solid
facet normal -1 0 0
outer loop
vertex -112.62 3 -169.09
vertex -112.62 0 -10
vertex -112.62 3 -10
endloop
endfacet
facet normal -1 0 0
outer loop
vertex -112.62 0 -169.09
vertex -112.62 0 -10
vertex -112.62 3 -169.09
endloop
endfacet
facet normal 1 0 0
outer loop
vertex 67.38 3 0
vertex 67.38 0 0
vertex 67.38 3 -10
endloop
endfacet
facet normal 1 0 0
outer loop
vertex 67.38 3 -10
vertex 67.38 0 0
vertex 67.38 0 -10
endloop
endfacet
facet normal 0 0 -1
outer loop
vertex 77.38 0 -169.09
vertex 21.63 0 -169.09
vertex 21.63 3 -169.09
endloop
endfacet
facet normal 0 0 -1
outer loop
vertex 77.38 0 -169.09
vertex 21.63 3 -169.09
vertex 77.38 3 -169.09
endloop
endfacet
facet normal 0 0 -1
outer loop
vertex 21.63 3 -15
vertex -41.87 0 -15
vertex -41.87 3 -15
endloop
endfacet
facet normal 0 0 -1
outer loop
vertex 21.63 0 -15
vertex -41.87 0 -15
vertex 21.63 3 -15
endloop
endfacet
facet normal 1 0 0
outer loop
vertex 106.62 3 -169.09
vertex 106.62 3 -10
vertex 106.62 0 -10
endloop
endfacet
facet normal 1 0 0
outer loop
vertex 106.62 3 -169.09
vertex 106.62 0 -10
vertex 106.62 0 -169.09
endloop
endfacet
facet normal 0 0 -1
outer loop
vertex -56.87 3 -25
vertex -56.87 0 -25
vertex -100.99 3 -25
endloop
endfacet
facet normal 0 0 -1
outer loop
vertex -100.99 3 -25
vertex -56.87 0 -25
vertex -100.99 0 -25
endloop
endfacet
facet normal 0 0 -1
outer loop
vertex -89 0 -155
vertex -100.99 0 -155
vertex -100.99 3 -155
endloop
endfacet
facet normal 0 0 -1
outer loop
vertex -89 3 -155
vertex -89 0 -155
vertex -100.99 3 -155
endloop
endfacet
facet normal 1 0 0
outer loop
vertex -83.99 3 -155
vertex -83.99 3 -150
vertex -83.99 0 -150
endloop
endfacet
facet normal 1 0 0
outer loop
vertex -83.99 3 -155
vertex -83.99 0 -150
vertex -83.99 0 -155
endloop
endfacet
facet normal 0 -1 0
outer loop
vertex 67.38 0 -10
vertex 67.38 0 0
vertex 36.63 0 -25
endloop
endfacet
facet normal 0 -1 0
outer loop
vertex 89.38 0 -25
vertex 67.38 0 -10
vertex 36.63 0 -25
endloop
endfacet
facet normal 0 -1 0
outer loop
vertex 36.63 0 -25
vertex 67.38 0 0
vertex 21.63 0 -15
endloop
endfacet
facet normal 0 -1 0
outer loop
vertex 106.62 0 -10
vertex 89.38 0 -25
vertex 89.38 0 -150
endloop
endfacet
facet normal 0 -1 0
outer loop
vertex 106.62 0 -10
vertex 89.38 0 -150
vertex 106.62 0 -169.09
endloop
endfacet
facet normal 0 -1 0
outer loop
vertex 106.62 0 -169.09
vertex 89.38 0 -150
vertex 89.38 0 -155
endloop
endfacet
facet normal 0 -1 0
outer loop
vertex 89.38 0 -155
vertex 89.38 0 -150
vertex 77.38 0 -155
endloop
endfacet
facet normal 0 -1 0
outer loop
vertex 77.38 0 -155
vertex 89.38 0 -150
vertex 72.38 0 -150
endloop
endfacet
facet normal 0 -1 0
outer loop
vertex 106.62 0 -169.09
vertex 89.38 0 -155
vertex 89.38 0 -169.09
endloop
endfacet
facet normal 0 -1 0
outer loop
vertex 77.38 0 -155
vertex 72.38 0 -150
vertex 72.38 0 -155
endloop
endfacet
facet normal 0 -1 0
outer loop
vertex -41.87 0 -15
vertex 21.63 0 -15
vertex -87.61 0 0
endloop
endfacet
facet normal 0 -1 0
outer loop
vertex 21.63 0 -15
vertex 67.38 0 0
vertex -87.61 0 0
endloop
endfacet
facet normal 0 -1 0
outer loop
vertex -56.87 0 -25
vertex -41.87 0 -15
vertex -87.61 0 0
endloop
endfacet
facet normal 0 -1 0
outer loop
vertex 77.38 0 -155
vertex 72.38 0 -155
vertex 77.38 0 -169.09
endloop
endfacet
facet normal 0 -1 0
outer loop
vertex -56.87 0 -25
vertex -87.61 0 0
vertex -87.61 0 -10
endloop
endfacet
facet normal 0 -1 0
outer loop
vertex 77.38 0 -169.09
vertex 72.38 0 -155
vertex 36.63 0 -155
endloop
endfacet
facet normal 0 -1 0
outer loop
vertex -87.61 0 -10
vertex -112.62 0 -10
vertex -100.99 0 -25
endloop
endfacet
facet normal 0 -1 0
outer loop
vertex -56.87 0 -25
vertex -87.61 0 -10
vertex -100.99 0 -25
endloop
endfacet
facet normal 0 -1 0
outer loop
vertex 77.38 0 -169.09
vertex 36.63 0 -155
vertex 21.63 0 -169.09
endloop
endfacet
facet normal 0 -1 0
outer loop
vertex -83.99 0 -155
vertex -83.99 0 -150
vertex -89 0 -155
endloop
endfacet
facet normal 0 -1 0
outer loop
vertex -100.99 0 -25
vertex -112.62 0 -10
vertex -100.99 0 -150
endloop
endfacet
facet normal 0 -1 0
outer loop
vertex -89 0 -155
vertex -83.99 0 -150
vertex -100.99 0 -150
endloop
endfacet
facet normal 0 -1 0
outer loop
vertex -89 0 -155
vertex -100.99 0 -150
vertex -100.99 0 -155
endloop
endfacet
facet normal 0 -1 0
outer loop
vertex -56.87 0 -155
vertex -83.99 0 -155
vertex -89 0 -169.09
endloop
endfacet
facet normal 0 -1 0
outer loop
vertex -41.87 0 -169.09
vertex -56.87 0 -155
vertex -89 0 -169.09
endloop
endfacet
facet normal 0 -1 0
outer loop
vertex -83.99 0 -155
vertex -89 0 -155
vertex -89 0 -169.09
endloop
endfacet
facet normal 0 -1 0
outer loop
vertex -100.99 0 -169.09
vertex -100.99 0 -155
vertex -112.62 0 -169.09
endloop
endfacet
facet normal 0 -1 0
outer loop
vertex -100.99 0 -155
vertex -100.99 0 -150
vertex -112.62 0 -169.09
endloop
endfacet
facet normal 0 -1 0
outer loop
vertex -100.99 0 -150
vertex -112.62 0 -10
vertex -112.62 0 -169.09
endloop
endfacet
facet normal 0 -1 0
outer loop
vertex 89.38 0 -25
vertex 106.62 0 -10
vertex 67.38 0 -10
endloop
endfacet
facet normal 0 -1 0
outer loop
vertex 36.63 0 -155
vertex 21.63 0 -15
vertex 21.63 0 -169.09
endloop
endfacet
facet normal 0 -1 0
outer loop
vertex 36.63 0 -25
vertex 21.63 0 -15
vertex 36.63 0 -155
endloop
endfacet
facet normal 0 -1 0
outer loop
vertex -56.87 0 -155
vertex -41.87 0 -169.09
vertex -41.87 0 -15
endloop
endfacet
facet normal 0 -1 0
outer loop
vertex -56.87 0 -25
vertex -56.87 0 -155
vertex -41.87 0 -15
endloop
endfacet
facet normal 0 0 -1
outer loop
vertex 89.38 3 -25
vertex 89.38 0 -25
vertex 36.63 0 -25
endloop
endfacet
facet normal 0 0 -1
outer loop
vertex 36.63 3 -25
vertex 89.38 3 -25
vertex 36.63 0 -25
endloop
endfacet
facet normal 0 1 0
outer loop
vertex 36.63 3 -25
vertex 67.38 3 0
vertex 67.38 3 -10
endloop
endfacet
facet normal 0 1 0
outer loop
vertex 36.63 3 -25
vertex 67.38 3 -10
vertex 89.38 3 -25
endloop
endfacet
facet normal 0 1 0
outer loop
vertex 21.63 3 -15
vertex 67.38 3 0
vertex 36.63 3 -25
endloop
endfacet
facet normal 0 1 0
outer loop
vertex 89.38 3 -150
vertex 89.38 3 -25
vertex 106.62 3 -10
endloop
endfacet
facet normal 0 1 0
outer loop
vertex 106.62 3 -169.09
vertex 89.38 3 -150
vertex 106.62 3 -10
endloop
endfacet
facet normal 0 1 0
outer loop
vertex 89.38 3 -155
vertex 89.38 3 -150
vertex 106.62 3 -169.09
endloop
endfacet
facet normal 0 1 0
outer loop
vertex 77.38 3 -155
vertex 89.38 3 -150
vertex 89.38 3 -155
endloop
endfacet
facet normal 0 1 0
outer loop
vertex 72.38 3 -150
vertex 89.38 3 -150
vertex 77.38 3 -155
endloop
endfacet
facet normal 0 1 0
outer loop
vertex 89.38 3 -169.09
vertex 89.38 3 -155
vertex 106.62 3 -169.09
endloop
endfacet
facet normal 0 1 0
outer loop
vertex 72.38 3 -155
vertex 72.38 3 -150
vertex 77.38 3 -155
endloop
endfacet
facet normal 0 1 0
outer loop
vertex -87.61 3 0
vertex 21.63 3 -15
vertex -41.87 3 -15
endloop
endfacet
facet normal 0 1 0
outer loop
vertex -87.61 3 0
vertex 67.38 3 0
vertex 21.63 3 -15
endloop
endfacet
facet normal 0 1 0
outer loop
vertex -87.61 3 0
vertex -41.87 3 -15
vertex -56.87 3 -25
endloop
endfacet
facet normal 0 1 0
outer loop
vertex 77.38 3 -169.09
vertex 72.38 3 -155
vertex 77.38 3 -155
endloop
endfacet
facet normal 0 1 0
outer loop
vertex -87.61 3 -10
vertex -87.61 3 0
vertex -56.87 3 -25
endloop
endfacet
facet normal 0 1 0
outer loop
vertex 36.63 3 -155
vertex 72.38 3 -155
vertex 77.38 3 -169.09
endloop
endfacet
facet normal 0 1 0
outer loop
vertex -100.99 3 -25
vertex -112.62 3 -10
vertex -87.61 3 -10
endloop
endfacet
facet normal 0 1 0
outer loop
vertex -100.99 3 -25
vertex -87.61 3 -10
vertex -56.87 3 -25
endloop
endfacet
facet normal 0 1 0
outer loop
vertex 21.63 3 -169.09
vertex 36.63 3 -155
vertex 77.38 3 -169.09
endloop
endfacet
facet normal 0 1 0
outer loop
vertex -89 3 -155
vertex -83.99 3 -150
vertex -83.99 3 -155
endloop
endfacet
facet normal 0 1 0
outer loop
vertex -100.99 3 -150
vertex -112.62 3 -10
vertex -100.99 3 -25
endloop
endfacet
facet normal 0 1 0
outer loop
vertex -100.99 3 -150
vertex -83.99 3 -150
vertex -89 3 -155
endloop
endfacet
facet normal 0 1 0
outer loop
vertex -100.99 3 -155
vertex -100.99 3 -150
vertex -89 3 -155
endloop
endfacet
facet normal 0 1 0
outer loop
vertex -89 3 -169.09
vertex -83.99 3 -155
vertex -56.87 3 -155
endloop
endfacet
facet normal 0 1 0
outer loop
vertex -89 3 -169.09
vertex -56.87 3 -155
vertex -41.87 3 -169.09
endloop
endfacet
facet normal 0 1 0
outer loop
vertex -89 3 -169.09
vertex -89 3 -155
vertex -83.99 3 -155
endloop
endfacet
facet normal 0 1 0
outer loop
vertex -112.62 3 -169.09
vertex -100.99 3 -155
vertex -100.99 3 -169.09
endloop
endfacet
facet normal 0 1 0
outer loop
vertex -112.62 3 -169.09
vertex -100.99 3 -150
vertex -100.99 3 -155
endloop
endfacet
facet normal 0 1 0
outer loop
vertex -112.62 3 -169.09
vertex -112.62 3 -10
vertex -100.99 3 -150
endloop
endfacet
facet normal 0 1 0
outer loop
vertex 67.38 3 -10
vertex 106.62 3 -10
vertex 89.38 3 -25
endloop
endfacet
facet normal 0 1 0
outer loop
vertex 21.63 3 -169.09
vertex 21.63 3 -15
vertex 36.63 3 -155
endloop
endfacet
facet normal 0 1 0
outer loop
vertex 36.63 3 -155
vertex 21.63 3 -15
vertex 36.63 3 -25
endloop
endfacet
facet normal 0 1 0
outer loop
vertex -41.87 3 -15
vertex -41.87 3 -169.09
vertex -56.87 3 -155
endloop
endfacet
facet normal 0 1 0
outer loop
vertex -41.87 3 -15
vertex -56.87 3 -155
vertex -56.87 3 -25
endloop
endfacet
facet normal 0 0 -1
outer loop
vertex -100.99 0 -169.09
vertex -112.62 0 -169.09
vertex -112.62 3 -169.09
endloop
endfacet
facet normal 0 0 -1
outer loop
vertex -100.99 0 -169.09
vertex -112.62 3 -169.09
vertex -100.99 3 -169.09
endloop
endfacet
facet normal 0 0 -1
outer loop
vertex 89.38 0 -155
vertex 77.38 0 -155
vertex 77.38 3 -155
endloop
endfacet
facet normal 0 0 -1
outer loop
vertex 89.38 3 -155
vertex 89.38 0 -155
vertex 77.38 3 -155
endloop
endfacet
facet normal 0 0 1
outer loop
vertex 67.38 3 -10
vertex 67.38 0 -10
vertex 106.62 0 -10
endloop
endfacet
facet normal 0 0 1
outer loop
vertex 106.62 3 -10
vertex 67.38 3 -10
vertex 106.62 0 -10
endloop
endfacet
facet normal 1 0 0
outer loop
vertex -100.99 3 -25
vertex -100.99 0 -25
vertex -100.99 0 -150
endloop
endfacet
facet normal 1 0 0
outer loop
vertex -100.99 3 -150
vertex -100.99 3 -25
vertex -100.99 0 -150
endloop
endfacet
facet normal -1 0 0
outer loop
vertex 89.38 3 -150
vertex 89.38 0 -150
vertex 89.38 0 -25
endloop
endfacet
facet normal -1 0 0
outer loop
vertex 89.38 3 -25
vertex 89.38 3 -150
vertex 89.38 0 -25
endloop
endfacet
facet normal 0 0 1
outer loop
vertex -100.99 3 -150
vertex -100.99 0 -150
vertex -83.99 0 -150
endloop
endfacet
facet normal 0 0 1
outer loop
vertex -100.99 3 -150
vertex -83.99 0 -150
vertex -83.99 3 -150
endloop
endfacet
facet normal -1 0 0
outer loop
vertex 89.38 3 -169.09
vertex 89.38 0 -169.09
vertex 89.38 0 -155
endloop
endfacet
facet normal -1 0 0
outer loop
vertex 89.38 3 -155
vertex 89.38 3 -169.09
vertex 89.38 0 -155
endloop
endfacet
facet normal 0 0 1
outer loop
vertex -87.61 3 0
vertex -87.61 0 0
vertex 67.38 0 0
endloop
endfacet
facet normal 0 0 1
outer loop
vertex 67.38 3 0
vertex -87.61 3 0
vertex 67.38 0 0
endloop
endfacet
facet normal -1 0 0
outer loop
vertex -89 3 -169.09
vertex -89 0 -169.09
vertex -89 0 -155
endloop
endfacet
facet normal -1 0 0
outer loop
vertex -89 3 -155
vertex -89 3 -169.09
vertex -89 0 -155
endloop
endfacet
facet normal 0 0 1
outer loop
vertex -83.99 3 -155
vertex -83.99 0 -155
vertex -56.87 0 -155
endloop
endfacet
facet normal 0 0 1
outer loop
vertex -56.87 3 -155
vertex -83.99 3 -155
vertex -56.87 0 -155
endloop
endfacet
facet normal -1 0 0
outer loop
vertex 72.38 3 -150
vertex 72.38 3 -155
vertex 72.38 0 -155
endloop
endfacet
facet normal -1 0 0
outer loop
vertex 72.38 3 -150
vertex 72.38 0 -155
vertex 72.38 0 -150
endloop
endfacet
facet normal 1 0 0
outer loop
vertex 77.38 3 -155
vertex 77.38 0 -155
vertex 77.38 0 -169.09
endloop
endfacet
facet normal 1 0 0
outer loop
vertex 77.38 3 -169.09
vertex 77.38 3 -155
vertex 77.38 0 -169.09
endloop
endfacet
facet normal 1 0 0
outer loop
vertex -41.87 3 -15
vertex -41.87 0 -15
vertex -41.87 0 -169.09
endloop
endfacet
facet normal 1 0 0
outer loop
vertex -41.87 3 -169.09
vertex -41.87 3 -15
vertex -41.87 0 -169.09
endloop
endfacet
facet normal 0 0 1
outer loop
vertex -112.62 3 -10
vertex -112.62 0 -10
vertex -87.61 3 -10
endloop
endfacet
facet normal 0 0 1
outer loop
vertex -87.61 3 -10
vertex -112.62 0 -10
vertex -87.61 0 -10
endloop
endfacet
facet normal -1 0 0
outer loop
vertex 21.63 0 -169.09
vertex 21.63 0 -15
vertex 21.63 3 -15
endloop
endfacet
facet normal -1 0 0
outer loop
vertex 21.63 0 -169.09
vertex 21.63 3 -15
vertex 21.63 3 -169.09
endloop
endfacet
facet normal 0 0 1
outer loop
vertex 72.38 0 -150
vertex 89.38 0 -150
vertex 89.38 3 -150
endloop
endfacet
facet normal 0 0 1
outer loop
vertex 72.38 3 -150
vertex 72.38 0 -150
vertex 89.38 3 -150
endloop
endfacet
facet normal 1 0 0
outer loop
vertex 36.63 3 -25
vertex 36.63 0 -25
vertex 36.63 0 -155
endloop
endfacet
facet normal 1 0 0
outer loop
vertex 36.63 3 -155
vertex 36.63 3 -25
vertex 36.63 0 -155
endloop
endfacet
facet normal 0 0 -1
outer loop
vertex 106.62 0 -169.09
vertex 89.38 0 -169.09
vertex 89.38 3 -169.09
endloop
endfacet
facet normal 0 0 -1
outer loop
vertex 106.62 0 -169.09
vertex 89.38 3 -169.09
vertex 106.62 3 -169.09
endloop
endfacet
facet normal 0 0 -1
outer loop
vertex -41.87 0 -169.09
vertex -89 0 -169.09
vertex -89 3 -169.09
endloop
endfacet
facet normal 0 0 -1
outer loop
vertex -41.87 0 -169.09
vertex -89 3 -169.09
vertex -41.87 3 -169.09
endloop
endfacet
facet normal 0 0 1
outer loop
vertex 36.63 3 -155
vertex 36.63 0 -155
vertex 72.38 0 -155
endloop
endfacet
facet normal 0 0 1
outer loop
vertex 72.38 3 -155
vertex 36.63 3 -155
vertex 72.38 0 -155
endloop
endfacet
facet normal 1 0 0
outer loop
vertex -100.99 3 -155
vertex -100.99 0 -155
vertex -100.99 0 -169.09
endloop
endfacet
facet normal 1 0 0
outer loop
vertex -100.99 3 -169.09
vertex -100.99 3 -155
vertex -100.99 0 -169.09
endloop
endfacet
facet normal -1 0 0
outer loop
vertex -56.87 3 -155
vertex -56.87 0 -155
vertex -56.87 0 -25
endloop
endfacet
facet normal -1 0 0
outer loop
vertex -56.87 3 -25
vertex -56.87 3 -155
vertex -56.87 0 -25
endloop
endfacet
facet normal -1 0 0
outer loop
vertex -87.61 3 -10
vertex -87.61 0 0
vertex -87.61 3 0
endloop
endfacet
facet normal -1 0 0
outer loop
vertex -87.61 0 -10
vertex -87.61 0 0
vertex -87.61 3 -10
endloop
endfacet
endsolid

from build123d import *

# Parameters (mm, degrees)
SKETCH1_W           = 225.24
SKETCH1_H           = 169.09
BOSS_EXTRUDE1_DEPTH = 3
SKETCH2_W           = 63.5
SKETCH2_H           = 154.09
SKETCH2_W_2         = 45.24
SKETCH2_H_2         = 10
SKETCH2_W_3         = 25.01
CUT_EXTRUDE1_DEPTH  = 204.183888387
SKETCH3_W           = 5
SKETCH3_H           = 3
BOSS_EXTRUDE2_DEPTH = 17
SKETCH4_W           = 5
SKETCH4_H           = 3
BOSS_EXTRUDE3_DEPTH = 17
SKETCH5_W           = 6
SKETCH5_H           = 159.09
CUT_EXTRUDE2_DEPTH  = 204.183888387


with BuildPart() as part:
    # Sketch1 → Boss-Extrude1 (new body)
    with BuildSketch(Plane(origin=(0, 0, 0), x_dir=(1, 0, 0), z_dir=(0, 1, 0))):
        with Locations((0, 84.545)):
            Rectangle(SKETCH1_W, SKETCH1_H)
    extrude(amount=BOSS_EXTRUDE1_DEPTH)

    # Sketch2 → Cut-Extrude1 (cut, through all)
    with BuildSketch(Plane(origin=(0, 0, 0), x_dir=(1, 0, 0), z_dir=(0, 1, 0))):
        Polygon((36.63, 25), (36.63, 155), (77.38, 155), (77.38, 169.09), (89.38, 169.09), (89.38, 25), align=None)
        Polygon((-100.99, 169.09), (-89, 169.09), (-89, 155), (-56.87, 155), (-56.87, 25), (-100.99, 25), align=None)
        with Locations((-10.12, 92.045)):
            Rectangle(SKETCH2_W, SKETCH2_H)
        with Locations((90, 5)):
            Rectangle(SKETCH2_W_2, SKETCH2_H_2)
        with Locations((-100.115, 5)):
            Rectangle(SKETCH2_W_3, SKETCH2_H_2)
    extrude(amount=CUT_EXTRUDE1_DEPTH, mode=Mode.SUBTRACT)

    # Sketch3 → Boss-Extrude2 (add)
    with BuildSketch(Plane.ZY.offset(-89.38)):
        with Locations((-152.5, 1.5)):
            Rectangle(SKETCH3_W, SKETCH3_H)
    extrude(amount=BOSS_EXTRUDE2_DEPTH)

    # Sketch4 → Boss-Extrude3 (add)
    with BuildSketch(Plane(origin=(-100.99, 0, 0), x_dir=(0, 0, -1), z_dir=(1, 0, 0))):
        with Locations((152.5, 1.5)):
            Rectangle(SKETCH4_W, SKETCH4_H)
    extrude(amount=BOSS_EXTRUDE3_DEPTH)

    # Sketch5 → Cut-Extrude2 (cut, through all)
    with BuildSketch(Plane(origin=(0, 3, 0), x_dir=(1, 0, 0), z_dir=(0, 1, 0))):
        with Locations((109.62, 89.545)):
            Rectangle(SKETCH5_W, SKETCH5_H)
    extrude(amount=-CUT_EXTRUDE2_DEPTH, mode=Mode.SUBTRACT)


solid = part.part
